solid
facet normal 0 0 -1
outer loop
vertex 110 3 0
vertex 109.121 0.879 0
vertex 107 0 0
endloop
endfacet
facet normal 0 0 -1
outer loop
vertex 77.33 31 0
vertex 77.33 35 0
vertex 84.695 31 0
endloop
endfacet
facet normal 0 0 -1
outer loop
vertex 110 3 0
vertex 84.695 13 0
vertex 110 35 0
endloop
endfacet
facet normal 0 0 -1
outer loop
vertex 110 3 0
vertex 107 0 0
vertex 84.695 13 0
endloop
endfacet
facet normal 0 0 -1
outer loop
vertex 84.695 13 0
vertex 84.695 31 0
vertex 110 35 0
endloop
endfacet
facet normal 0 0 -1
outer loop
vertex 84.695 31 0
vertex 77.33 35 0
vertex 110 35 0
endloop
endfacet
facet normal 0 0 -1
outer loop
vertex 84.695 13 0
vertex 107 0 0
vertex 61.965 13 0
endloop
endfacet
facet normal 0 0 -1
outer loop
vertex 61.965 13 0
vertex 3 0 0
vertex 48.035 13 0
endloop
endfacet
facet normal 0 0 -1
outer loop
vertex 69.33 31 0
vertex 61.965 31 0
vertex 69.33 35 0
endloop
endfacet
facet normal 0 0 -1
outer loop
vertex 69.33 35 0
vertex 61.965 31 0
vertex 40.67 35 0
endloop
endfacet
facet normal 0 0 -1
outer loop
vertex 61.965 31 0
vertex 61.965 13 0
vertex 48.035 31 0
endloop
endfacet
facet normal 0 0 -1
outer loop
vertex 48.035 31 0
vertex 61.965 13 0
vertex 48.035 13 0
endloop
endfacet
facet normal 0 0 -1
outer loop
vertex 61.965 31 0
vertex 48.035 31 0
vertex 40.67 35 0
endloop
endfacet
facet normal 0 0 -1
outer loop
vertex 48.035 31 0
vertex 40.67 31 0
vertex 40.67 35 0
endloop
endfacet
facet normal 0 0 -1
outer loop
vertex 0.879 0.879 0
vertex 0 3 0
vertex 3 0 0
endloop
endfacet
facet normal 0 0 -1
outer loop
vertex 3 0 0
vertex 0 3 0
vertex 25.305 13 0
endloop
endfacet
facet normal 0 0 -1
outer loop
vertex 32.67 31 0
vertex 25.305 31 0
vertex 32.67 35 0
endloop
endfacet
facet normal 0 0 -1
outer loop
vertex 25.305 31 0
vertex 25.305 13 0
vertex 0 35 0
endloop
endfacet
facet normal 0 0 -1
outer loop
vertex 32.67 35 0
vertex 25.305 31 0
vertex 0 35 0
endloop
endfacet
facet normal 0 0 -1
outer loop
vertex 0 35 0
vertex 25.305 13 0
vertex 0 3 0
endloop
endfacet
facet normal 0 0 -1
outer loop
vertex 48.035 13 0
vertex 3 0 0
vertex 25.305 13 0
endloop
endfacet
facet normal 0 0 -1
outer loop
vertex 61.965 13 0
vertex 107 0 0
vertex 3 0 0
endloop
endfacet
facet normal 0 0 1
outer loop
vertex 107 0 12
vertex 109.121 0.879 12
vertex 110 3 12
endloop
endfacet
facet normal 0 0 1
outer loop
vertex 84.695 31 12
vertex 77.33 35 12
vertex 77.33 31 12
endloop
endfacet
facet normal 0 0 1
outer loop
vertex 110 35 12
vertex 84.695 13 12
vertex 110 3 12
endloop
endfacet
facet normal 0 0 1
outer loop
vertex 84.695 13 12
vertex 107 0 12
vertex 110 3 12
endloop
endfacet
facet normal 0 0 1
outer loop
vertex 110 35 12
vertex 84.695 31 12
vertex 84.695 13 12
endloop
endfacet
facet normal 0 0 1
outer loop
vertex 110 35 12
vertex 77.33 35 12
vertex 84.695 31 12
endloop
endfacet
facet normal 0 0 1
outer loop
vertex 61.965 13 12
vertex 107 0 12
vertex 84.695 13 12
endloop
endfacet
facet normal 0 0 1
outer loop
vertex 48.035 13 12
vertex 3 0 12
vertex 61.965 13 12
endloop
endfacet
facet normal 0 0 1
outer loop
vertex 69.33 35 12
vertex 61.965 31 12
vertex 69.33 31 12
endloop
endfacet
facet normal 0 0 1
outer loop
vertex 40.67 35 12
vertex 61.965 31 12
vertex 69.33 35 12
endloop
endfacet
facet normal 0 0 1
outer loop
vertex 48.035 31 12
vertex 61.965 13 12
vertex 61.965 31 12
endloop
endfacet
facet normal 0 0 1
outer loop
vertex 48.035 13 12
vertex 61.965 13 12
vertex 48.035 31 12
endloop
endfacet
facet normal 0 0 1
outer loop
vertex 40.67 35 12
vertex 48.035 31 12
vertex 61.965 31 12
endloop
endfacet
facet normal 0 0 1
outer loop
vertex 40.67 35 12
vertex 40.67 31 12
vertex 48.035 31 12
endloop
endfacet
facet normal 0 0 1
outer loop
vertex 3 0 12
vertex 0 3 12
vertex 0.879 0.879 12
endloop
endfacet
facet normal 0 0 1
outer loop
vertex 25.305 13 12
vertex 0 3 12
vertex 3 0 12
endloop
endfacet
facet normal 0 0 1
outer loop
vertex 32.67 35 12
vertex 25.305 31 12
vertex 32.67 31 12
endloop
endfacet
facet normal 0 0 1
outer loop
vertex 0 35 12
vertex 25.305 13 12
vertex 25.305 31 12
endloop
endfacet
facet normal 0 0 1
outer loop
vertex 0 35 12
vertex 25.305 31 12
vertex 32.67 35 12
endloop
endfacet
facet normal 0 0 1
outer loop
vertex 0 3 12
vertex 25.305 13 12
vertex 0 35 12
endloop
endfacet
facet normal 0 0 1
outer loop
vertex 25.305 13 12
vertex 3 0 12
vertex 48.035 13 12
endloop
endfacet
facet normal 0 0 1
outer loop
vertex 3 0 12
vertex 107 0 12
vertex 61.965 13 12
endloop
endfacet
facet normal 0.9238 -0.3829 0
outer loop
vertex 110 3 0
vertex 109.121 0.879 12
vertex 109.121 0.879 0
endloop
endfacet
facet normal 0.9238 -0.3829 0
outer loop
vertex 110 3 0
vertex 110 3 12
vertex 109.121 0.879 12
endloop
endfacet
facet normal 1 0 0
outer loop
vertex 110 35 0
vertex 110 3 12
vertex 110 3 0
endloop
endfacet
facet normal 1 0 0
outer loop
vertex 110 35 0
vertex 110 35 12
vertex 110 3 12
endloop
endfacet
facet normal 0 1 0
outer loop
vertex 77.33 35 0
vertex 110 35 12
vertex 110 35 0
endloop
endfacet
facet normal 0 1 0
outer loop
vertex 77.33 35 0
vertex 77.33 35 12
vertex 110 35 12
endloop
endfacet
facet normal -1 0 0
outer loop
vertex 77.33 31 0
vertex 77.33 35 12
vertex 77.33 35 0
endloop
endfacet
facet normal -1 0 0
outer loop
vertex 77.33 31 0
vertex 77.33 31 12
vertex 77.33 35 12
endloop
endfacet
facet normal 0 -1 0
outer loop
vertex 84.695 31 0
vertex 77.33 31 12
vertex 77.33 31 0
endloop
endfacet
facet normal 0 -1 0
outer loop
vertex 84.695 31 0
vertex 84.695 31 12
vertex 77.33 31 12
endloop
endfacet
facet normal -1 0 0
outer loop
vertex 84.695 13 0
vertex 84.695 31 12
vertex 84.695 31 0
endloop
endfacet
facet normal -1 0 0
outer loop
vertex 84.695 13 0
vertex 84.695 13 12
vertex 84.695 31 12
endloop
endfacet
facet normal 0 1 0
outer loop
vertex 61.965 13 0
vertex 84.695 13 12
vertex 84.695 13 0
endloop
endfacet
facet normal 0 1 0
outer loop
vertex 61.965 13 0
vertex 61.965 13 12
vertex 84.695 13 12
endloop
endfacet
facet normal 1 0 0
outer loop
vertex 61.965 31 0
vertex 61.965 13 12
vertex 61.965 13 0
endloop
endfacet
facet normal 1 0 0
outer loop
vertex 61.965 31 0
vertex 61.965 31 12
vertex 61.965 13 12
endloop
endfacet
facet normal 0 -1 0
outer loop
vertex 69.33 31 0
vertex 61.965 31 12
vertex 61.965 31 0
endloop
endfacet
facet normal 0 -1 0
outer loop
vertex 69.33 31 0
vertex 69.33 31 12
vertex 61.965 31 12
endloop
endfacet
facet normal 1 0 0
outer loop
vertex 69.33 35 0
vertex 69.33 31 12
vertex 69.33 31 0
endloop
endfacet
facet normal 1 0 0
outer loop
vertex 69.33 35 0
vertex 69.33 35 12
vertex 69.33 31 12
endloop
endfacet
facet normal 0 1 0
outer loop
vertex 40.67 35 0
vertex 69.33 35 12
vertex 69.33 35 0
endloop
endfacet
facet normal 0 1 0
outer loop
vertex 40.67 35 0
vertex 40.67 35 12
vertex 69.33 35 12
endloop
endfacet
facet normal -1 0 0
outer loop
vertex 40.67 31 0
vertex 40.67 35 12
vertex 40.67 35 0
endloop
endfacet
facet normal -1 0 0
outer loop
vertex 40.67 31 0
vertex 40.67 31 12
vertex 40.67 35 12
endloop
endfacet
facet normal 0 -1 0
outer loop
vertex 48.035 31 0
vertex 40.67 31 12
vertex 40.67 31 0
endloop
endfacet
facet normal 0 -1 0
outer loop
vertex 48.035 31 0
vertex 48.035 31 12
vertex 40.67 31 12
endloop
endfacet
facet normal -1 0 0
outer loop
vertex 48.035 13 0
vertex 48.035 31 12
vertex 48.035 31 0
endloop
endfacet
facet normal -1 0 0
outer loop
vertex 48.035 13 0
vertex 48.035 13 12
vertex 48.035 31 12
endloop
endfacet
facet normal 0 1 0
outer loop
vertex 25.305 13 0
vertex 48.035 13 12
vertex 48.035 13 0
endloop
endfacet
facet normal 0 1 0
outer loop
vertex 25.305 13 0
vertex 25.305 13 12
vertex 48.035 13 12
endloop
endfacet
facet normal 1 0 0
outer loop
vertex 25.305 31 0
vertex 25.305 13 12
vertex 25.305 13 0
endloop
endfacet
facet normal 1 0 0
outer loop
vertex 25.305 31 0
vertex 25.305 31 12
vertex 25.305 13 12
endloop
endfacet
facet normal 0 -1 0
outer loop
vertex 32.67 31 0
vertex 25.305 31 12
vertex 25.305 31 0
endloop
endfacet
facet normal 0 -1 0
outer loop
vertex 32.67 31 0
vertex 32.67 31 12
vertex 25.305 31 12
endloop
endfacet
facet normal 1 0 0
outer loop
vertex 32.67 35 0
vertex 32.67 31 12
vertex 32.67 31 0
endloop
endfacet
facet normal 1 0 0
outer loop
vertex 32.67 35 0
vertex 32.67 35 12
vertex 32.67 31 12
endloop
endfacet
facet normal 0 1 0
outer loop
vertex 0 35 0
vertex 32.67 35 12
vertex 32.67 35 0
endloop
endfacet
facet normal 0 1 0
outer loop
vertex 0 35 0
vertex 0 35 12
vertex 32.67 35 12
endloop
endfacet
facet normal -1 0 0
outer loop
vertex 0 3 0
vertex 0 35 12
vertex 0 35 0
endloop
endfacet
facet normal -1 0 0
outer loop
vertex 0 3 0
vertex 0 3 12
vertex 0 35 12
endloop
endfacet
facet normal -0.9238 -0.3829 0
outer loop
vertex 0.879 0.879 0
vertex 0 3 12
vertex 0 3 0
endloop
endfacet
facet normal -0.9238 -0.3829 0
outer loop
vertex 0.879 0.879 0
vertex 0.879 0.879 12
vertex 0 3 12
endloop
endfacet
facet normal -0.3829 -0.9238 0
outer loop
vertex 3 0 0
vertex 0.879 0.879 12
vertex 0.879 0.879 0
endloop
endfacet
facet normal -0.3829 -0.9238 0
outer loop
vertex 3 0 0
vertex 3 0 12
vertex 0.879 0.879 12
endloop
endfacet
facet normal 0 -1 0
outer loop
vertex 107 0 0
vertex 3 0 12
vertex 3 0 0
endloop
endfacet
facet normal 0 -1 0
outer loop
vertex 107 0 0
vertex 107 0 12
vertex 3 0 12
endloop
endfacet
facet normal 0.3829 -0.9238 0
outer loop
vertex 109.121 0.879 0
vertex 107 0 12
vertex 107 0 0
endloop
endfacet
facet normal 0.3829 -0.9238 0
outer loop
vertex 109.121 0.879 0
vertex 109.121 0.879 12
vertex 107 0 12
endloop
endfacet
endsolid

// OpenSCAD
$fn = 32;

// ----------------------------------------------------------------------
// Window plate: 110 x 35 mm, 2 open windows
// ----------------------------------------------------------------------

// --- parameters (mm) ---
profile_height = 12;      // extrusion height
profile_points = 24;      // points of the closed outline

profile = [[0, 3], [0.879, 0.879], [3, 0], [107, 0], [109.121, 0.879], [110, 3], [110, 35], [77.33, 35], [77.33, 31], [84.695, 31], [84.695, 13], [61.965, 13], [61.965, 31], [69.33, 31], [69.33, 35], [40.67, 35], [40.67, 31], [48.035, 31], [48.035, 13], [25.305, 13], [25.305, 31], [32.67, 31], [32.67, 35], [0, 35]];  // single closed polygon, 24 points, counter clockwise

// --- the one profile operation ---
linear_extrude(height = profile_height) polygon(points = profile);
